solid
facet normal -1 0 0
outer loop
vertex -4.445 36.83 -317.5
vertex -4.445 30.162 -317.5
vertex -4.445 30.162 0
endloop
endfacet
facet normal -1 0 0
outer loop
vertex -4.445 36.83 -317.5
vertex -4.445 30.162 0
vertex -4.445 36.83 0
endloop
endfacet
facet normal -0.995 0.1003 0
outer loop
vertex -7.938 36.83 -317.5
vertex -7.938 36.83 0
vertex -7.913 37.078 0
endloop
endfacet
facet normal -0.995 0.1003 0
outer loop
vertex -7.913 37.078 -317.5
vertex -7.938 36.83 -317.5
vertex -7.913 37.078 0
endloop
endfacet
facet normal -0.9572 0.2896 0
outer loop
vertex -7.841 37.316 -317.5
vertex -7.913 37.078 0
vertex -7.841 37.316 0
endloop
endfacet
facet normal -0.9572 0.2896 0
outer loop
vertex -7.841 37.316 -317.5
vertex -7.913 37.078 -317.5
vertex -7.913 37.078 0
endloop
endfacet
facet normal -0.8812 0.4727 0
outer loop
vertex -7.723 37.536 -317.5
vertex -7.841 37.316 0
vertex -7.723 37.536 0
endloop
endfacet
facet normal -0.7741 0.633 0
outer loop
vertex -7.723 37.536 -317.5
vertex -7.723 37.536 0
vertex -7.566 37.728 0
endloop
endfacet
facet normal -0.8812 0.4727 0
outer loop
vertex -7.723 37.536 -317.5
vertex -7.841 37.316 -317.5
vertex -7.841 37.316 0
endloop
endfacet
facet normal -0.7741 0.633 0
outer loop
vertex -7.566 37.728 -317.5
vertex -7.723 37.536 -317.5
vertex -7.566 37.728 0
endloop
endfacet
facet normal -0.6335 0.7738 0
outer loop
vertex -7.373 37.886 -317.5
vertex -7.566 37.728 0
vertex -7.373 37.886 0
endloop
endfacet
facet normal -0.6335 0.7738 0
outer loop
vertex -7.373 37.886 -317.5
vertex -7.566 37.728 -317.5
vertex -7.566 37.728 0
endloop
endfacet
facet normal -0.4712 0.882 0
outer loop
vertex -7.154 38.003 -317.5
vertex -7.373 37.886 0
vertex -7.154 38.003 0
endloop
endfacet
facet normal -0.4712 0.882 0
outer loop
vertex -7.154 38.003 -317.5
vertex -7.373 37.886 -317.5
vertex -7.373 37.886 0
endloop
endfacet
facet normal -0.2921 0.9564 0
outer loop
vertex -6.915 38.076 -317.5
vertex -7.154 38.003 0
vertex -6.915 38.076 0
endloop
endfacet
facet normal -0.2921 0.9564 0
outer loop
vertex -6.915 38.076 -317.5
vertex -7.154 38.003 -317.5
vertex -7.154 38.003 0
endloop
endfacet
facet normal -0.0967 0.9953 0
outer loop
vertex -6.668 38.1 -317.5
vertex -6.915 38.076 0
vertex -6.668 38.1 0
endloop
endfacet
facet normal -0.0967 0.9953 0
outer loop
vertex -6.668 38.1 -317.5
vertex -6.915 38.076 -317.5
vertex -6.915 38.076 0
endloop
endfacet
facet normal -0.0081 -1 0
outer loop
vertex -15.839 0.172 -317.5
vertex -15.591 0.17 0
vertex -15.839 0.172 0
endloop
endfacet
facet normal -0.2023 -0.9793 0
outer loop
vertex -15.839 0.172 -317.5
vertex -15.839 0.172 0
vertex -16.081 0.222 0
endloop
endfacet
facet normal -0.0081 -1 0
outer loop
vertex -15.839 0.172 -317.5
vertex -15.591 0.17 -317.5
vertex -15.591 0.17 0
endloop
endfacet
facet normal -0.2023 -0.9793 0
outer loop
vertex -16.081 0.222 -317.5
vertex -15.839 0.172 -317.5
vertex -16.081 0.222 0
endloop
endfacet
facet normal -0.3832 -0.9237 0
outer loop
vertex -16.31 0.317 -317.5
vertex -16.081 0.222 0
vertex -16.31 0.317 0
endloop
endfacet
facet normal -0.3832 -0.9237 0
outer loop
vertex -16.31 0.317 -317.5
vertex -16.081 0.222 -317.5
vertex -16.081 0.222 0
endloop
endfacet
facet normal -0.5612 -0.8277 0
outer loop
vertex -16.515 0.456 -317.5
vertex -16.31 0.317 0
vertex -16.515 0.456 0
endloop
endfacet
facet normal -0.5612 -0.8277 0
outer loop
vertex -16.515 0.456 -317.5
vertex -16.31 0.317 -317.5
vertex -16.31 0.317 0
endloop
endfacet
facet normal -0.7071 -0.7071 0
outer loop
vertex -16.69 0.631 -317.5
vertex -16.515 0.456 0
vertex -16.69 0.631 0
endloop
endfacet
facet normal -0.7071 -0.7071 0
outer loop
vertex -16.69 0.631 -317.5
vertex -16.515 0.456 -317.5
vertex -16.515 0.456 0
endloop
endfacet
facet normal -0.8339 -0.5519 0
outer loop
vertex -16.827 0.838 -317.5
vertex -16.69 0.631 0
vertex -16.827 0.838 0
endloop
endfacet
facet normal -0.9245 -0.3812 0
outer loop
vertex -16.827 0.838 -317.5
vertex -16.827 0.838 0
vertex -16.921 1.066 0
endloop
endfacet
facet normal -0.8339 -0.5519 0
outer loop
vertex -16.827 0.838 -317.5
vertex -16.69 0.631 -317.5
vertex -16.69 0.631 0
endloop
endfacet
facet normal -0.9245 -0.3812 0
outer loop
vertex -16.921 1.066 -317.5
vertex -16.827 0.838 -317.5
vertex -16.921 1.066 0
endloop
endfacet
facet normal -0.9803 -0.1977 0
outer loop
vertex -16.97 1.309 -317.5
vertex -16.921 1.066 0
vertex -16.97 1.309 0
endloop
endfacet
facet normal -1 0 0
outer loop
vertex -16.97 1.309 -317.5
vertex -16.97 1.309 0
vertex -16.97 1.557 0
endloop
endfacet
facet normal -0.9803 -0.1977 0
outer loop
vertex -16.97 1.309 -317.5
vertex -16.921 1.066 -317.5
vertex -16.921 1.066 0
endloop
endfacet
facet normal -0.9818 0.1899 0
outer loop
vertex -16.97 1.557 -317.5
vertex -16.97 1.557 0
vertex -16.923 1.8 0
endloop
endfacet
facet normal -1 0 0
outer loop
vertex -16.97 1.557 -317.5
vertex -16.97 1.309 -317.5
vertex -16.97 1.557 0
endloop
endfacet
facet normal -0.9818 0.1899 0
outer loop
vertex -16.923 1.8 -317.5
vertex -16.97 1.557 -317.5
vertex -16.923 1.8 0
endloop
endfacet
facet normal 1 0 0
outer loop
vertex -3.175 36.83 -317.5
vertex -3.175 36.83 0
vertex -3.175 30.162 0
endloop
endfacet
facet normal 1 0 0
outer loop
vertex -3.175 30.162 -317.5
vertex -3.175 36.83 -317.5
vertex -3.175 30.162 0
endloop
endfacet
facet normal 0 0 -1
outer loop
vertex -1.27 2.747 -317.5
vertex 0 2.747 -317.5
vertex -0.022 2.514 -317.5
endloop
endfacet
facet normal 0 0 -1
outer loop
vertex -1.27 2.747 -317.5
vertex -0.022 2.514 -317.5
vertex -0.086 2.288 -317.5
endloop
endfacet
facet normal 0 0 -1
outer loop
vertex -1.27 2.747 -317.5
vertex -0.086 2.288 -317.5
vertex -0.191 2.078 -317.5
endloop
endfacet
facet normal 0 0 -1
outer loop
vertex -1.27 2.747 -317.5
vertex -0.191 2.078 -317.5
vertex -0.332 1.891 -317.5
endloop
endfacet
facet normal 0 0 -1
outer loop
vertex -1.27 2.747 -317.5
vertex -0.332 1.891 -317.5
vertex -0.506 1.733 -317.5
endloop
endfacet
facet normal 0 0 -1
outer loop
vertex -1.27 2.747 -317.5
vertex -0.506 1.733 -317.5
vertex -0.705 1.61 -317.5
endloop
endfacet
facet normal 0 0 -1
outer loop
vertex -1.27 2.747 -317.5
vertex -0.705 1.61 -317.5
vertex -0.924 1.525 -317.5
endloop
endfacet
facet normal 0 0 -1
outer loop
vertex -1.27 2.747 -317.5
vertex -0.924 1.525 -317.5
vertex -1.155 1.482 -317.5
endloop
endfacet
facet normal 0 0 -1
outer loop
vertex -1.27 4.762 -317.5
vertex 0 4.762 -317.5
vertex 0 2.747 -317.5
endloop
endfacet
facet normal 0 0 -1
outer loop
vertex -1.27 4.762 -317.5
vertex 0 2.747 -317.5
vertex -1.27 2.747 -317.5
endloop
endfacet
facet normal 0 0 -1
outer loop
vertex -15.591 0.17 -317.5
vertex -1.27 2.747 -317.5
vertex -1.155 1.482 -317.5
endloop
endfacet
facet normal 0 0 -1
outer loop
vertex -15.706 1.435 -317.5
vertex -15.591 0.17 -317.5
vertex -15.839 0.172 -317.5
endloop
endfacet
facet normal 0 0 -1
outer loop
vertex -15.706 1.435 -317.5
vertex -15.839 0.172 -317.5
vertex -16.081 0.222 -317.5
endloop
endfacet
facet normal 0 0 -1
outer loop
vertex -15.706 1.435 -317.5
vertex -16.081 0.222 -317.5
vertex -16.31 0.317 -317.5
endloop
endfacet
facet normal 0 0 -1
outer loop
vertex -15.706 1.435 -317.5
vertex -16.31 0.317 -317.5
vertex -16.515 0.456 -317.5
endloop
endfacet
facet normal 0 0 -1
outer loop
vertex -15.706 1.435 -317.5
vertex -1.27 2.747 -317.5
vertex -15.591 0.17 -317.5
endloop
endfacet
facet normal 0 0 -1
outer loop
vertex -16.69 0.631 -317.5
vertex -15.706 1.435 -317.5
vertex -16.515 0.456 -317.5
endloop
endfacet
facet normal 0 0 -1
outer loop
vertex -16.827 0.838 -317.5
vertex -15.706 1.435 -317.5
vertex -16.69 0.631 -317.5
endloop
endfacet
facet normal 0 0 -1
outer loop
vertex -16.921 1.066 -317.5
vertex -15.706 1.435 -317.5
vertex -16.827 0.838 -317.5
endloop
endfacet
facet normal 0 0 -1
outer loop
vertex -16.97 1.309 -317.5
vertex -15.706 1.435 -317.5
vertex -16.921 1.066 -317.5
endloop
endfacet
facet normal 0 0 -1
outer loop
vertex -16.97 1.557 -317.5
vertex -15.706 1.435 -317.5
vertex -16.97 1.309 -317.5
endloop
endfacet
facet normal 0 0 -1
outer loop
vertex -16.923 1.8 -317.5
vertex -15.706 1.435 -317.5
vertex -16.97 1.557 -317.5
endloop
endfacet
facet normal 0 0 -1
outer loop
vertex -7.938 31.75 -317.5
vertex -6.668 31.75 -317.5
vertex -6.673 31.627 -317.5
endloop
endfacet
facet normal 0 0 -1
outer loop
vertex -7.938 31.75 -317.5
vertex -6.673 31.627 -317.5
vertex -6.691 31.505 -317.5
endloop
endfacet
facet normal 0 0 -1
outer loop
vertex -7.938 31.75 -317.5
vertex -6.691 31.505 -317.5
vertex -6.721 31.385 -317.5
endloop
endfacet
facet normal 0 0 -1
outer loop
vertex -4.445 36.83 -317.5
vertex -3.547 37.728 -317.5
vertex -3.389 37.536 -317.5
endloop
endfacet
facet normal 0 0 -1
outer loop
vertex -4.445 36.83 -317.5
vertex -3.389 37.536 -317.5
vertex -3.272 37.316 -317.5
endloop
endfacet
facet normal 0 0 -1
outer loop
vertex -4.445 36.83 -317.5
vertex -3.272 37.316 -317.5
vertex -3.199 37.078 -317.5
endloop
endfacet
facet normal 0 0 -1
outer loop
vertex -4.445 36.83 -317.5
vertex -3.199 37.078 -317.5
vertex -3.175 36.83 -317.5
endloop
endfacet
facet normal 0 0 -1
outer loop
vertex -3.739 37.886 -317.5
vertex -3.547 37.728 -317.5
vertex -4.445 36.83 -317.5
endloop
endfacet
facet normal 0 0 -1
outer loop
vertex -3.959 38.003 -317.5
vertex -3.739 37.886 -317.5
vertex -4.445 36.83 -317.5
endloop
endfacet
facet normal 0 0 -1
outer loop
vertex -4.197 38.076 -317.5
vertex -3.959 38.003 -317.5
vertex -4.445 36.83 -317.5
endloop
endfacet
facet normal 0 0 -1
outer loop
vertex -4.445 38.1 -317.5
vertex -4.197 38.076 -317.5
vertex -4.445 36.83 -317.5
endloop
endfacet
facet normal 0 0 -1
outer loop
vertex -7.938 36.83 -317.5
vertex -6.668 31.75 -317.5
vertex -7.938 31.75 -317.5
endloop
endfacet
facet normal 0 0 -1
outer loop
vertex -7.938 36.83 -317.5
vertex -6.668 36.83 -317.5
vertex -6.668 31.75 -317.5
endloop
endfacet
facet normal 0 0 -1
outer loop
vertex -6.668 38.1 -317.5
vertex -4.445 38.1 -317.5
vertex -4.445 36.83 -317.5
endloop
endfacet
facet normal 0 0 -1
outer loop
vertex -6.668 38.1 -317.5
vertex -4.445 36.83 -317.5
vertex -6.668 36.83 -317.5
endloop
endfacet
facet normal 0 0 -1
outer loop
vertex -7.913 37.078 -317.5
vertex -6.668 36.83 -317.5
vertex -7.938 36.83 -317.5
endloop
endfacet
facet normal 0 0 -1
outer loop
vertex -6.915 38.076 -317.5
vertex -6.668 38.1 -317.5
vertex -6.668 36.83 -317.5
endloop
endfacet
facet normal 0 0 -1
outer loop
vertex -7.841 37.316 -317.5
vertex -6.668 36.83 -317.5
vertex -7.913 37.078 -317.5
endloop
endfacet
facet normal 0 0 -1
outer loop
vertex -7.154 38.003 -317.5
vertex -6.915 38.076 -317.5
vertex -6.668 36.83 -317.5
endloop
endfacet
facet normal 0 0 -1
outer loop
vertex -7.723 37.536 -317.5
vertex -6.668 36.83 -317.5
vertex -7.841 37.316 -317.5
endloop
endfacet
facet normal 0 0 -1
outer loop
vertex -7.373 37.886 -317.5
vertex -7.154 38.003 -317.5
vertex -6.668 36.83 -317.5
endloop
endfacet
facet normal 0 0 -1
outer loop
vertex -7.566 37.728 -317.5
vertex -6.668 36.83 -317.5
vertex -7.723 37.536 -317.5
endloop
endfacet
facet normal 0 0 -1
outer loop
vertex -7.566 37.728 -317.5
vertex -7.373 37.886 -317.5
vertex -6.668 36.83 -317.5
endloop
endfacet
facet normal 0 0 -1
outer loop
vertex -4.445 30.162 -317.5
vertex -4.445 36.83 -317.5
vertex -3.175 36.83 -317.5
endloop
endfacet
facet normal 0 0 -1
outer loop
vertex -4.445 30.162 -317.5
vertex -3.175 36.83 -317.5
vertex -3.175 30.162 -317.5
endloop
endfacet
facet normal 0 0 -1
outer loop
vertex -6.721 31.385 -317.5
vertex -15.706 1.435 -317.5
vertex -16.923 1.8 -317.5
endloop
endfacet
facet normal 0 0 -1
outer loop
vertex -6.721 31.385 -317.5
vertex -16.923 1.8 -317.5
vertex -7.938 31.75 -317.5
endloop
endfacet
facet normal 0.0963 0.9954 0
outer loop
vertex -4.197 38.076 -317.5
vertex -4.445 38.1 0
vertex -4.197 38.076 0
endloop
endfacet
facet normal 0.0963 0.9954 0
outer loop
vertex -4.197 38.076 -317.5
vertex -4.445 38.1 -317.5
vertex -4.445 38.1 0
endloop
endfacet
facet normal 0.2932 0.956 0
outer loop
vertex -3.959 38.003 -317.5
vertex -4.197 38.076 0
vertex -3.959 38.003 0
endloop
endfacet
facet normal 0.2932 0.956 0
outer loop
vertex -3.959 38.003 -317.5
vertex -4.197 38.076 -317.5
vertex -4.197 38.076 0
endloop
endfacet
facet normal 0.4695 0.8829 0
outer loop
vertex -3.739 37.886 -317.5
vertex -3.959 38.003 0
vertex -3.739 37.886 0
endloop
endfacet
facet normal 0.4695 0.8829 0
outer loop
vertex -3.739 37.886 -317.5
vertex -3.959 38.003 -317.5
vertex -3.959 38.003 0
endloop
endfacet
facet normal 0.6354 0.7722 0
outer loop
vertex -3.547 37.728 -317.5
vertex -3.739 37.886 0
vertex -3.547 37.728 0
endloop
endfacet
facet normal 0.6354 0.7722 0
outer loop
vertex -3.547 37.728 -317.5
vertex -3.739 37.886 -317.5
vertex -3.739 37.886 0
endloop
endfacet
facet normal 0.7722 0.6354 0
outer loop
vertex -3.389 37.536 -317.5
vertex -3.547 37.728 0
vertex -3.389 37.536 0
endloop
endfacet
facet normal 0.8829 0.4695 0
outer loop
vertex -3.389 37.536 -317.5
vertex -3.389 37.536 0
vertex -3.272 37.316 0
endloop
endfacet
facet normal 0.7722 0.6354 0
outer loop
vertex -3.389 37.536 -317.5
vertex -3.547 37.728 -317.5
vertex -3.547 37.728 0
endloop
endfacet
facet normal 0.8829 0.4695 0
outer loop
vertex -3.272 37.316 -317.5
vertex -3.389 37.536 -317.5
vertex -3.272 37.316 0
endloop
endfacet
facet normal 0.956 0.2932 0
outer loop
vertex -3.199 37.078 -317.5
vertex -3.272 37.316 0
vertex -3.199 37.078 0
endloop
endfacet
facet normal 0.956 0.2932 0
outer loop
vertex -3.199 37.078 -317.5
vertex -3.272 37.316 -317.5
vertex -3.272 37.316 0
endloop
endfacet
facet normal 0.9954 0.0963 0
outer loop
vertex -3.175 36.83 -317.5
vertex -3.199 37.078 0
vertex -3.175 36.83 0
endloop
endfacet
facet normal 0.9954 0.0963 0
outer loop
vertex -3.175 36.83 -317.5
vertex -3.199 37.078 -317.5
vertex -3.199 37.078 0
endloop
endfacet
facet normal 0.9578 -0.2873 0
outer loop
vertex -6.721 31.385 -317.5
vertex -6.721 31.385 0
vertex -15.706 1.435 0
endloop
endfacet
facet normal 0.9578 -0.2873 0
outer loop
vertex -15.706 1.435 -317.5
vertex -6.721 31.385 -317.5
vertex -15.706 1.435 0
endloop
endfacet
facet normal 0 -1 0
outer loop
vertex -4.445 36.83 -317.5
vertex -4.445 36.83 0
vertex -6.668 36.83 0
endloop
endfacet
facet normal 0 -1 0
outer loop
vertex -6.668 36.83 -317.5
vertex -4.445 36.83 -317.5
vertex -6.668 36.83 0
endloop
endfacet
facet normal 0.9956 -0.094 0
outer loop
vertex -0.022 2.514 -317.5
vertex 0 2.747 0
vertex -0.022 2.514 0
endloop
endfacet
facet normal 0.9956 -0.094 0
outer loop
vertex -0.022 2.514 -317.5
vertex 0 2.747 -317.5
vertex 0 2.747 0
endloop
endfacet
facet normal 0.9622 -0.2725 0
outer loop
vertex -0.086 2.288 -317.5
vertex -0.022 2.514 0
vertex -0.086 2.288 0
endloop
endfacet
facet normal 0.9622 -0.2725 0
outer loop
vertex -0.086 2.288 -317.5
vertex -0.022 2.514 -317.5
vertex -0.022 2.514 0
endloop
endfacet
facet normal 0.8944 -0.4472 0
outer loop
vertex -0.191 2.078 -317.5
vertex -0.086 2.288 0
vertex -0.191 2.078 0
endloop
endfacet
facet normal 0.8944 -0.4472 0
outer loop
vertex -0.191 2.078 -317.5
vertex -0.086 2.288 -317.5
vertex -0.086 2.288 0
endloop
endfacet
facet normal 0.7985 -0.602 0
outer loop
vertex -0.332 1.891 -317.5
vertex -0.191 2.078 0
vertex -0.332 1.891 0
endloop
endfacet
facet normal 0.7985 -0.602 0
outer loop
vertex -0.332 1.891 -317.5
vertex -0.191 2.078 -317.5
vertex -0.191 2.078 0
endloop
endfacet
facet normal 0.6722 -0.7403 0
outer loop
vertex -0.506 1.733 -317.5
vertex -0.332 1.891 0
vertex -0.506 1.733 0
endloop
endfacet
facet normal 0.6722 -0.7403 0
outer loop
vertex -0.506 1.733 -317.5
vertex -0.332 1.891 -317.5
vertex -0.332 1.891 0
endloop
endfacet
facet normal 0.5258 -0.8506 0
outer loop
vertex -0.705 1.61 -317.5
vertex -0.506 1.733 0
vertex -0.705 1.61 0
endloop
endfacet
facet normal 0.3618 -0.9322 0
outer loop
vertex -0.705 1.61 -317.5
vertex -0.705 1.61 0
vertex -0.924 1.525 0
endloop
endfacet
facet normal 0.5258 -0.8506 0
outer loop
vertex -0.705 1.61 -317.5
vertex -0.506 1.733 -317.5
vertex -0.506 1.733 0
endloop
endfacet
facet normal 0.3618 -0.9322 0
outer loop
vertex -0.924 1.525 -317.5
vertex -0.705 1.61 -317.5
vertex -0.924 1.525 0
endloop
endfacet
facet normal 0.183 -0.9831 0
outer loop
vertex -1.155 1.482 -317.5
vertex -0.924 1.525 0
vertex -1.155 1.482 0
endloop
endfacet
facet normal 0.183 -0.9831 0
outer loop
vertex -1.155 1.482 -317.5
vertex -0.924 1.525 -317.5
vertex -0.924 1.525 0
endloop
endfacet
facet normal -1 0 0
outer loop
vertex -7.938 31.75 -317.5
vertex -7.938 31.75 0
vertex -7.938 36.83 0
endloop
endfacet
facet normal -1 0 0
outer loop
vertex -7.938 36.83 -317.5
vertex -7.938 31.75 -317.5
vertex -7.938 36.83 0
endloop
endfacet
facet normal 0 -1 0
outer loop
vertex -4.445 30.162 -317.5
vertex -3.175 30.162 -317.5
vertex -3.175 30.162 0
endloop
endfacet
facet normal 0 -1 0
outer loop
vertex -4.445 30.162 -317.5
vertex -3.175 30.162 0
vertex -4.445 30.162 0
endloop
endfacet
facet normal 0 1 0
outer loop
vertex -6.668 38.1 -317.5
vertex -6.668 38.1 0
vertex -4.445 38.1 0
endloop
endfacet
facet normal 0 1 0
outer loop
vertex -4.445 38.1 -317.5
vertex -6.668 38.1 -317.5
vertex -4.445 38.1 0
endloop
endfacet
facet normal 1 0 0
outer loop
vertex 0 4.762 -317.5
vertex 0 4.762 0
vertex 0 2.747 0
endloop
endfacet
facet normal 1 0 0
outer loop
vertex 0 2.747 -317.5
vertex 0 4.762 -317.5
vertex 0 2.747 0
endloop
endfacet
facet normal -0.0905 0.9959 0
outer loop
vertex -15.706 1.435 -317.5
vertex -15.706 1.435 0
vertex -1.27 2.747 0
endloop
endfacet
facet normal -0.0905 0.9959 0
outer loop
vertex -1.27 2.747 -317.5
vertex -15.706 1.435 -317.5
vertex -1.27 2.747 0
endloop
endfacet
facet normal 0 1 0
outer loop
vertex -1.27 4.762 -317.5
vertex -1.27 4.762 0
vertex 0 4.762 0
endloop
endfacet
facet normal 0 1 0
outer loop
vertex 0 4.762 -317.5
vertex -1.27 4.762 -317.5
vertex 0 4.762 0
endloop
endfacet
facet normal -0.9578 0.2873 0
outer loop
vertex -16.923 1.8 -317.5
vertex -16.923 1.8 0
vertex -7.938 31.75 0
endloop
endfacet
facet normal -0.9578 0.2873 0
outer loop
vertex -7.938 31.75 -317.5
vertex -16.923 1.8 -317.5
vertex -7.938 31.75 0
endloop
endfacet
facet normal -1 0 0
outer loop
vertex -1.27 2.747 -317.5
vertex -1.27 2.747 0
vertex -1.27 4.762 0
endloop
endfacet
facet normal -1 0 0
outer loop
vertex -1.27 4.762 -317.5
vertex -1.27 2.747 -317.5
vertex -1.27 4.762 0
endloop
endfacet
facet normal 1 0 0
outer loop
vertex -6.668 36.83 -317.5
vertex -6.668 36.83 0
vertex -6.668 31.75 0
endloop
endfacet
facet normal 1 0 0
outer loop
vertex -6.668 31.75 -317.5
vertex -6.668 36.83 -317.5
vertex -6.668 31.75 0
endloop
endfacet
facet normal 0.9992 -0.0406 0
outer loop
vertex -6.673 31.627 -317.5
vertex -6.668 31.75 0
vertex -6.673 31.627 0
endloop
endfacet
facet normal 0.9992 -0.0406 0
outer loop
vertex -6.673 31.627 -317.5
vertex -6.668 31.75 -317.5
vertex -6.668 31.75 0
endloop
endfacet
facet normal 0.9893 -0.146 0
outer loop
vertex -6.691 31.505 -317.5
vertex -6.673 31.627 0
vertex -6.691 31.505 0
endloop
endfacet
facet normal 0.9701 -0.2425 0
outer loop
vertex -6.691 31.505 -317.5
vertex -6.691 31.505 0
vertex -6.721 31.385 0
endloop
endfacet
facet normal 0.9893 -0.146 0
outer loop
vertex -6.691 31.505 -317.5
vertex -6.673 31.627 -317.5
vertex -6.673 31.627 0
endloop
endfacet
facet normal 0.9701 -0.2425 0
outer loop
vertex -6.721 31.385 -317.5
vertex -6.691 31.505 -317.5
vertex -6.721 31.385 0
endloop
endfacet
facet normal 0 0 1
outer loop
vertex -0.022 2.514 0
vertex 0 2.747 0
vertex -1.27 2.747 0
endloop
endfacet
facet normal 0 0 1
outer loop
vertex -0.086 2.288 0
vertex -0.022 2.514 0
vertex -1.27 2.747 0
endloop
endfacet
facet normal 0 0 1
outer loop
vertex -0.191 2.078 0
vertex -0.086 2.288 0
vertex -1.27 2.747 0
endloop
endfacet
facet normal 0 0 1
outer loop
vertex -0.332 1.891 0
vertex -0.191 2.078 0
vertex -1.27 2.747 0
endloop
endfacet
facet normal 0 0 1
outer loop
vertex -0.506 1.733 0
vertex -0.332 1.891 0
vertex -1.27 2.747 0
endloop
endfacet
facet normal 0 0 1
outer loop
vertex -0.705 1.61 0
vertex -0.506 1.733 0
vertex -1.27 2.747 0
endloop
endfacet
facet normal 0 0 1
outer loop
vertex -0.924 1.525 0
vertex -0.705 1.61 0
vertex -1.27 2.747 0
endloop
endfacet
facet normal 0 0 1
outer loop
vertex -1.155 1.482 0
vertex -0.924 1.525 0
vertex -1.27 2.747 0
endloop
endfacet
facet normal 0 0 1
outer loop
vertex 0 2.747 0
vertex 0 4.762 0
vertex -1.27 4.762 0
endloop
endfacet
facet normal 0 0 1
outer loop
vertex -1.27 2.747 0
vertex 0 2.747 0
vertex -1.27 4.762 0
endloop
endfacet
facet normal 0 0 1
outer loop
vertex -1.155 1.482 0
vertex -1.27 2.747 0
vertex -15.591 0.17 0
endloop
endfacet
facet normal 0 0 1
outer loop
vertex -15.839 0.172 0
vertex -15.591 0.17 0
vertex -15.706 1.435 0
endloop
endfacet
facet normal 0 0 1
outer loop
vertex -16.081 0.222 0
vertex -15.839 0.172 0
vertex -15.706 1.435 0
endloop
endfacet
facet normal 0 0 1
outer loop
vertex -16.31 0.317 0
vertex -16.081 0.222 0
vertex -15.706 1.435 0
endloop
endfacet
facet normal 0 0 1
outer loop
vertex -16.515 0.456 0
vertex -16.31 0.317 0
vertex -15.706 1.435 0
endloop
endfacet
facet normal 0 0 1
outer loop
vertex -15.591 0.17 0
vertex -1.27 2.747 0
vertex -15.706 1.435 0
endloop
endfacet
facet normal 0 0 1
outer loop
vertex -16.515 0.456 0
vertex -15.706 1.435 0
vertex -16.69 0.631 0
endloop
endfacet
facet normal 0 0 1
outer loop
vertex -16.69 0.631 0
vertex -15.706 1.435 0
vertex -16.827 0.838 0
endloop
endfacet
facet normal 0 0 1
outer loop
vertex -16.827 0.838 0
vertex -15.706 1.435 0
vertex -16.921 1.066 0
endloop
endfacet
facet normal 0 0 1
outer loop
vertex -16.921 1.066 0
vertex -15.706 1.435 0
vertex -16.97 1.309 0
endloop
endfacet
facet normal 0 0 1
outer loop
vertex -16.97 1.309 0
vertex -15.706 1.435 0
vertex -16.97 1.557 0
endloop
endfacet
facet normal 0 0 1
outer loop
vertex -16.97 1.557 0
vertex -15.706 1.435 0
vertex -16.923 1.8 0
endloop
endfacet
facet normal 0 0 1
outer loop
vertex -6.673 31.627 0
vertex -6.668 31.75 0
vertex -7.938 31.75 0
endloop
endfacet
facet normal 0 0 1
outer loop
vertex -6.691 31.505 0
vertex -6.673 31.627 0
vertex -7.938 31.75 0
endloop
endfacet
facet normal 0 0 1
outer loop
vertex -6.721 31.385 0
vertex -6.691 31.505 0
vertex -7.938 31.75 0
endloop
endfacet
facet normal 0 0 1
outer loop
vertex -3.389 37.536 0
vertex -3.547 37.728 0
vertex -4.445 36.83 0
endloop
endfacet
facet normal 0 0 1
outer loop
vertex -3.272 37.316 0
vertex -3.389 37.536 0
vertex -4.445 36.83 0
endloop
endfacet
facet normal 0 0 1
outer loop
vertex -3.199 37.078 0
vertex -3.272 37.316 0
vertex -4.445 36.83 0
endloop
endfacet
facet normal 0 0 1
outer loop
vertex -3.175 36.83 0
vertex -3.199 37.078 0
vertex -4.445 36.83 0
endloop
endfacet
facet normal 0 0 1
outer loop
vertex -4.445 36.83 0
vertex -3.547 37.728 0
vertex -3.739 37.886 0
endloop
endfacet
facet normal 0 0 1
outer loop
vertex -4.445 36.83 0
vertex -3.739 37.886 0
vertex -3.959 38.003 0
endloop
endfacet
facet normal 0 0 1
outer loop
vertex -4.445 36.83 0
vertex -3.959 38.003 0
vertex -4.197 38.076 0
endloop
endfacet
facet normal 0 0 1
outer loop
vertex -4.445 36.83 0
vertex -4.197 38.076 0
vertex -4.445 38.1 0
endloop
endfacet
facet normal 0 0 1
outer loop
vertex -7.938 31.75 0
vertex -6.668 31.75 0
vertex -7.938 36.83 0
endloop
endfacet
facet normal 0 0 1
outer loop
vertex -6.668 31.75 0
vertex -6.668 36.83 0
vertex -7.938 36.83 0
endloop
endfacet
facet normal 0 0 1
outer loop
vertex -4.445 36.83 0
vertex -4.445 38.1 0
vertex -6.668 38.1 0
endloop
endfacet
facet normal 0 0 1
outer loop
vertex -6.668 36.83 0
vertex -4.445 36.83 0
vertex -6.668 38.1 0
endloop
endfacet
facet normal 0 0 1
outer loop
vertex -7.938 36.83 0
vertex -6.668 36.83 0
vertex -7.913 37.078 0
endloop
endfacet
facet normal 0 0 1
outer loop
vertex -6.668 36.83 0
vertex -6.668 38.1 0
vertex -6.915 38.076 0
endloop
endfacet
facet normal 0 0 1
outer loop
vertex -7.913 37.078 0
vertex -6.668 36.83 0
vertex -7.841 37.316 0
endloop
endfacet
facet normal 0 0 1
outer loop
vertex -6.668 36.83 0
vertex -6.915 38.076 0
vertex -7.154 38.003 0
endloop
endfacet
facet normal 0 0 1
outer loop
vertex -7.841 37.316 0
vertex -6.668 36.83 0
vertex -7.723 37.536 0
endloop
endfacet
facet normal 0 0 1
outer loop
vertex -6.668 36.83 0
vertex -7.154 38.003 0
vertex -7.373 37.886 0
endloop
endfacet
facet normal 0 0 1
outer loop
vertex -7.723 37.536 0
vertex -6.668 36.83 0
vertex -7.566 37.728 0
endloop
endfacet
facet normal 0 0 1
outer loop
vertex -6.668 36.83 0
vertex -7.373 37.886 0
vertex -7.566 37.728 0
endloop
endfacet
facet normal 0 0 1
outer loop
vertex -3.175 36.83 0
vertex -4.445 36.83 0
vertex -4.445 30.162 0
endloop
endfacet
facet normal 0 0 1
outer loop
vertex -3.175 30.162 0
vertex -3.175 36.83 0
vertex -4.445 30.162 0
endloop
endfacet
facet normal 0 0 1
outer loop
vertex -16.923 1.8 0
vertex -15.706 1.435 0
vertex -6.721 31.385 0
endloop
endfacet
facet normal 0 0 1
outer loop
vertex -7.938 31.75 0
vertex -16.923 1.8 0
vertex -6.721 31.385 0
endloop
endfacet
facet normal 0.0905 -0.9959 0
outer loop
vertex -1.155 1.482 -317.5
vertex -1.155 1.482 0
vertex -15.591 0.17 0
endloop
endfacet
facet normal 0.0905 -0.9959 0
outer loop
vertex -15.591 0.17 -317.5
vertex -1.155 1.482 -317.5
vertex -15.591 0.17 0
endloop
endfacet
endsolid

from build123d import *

# Parameters (mm, degrees)
EXTRUDE_THIN1_DEPTH = 317.5
FILLET1_R           = 1.27


with BuildPart() as part:
    # Sketch1 → Extrude-Thin1 (new body)
    with BuildSketch(Plane.XY):
        Polygon((0, 4.7625), (0, 1.5875), (-17.4625, 0), (-7.9375, 31.75), (-7.9375, 38.1), (-3.175, 38.1), (-3.175, 30.1625), (-4.445, 30.1625), (-4.445, 36.83), (-6.6675, 36.83), (-6.6675, 31.563603578), (-15.706108342, 1.434909105), (-1.27, 2.74728259), (-1.27, 4.7625), align=None)
    extrude(amount=-EXTRUDE_THIN1_DEPTH)

    # Fillet1
    fillet1_edges = [part.edges().sort_by_distance(p)[0] for p in [
        (-6.6675, 31.563603578, -158.75),
        (0, 1.5875, -158.75),
        (-17.4625, 0, -158.75),
        (-7.9375, 38.1, -158.75),
        (-3.175, 38.1, -158.75),
    ]]
    fillet(fillet1_edges, radius=FILLET1_R)


solid = part.part
